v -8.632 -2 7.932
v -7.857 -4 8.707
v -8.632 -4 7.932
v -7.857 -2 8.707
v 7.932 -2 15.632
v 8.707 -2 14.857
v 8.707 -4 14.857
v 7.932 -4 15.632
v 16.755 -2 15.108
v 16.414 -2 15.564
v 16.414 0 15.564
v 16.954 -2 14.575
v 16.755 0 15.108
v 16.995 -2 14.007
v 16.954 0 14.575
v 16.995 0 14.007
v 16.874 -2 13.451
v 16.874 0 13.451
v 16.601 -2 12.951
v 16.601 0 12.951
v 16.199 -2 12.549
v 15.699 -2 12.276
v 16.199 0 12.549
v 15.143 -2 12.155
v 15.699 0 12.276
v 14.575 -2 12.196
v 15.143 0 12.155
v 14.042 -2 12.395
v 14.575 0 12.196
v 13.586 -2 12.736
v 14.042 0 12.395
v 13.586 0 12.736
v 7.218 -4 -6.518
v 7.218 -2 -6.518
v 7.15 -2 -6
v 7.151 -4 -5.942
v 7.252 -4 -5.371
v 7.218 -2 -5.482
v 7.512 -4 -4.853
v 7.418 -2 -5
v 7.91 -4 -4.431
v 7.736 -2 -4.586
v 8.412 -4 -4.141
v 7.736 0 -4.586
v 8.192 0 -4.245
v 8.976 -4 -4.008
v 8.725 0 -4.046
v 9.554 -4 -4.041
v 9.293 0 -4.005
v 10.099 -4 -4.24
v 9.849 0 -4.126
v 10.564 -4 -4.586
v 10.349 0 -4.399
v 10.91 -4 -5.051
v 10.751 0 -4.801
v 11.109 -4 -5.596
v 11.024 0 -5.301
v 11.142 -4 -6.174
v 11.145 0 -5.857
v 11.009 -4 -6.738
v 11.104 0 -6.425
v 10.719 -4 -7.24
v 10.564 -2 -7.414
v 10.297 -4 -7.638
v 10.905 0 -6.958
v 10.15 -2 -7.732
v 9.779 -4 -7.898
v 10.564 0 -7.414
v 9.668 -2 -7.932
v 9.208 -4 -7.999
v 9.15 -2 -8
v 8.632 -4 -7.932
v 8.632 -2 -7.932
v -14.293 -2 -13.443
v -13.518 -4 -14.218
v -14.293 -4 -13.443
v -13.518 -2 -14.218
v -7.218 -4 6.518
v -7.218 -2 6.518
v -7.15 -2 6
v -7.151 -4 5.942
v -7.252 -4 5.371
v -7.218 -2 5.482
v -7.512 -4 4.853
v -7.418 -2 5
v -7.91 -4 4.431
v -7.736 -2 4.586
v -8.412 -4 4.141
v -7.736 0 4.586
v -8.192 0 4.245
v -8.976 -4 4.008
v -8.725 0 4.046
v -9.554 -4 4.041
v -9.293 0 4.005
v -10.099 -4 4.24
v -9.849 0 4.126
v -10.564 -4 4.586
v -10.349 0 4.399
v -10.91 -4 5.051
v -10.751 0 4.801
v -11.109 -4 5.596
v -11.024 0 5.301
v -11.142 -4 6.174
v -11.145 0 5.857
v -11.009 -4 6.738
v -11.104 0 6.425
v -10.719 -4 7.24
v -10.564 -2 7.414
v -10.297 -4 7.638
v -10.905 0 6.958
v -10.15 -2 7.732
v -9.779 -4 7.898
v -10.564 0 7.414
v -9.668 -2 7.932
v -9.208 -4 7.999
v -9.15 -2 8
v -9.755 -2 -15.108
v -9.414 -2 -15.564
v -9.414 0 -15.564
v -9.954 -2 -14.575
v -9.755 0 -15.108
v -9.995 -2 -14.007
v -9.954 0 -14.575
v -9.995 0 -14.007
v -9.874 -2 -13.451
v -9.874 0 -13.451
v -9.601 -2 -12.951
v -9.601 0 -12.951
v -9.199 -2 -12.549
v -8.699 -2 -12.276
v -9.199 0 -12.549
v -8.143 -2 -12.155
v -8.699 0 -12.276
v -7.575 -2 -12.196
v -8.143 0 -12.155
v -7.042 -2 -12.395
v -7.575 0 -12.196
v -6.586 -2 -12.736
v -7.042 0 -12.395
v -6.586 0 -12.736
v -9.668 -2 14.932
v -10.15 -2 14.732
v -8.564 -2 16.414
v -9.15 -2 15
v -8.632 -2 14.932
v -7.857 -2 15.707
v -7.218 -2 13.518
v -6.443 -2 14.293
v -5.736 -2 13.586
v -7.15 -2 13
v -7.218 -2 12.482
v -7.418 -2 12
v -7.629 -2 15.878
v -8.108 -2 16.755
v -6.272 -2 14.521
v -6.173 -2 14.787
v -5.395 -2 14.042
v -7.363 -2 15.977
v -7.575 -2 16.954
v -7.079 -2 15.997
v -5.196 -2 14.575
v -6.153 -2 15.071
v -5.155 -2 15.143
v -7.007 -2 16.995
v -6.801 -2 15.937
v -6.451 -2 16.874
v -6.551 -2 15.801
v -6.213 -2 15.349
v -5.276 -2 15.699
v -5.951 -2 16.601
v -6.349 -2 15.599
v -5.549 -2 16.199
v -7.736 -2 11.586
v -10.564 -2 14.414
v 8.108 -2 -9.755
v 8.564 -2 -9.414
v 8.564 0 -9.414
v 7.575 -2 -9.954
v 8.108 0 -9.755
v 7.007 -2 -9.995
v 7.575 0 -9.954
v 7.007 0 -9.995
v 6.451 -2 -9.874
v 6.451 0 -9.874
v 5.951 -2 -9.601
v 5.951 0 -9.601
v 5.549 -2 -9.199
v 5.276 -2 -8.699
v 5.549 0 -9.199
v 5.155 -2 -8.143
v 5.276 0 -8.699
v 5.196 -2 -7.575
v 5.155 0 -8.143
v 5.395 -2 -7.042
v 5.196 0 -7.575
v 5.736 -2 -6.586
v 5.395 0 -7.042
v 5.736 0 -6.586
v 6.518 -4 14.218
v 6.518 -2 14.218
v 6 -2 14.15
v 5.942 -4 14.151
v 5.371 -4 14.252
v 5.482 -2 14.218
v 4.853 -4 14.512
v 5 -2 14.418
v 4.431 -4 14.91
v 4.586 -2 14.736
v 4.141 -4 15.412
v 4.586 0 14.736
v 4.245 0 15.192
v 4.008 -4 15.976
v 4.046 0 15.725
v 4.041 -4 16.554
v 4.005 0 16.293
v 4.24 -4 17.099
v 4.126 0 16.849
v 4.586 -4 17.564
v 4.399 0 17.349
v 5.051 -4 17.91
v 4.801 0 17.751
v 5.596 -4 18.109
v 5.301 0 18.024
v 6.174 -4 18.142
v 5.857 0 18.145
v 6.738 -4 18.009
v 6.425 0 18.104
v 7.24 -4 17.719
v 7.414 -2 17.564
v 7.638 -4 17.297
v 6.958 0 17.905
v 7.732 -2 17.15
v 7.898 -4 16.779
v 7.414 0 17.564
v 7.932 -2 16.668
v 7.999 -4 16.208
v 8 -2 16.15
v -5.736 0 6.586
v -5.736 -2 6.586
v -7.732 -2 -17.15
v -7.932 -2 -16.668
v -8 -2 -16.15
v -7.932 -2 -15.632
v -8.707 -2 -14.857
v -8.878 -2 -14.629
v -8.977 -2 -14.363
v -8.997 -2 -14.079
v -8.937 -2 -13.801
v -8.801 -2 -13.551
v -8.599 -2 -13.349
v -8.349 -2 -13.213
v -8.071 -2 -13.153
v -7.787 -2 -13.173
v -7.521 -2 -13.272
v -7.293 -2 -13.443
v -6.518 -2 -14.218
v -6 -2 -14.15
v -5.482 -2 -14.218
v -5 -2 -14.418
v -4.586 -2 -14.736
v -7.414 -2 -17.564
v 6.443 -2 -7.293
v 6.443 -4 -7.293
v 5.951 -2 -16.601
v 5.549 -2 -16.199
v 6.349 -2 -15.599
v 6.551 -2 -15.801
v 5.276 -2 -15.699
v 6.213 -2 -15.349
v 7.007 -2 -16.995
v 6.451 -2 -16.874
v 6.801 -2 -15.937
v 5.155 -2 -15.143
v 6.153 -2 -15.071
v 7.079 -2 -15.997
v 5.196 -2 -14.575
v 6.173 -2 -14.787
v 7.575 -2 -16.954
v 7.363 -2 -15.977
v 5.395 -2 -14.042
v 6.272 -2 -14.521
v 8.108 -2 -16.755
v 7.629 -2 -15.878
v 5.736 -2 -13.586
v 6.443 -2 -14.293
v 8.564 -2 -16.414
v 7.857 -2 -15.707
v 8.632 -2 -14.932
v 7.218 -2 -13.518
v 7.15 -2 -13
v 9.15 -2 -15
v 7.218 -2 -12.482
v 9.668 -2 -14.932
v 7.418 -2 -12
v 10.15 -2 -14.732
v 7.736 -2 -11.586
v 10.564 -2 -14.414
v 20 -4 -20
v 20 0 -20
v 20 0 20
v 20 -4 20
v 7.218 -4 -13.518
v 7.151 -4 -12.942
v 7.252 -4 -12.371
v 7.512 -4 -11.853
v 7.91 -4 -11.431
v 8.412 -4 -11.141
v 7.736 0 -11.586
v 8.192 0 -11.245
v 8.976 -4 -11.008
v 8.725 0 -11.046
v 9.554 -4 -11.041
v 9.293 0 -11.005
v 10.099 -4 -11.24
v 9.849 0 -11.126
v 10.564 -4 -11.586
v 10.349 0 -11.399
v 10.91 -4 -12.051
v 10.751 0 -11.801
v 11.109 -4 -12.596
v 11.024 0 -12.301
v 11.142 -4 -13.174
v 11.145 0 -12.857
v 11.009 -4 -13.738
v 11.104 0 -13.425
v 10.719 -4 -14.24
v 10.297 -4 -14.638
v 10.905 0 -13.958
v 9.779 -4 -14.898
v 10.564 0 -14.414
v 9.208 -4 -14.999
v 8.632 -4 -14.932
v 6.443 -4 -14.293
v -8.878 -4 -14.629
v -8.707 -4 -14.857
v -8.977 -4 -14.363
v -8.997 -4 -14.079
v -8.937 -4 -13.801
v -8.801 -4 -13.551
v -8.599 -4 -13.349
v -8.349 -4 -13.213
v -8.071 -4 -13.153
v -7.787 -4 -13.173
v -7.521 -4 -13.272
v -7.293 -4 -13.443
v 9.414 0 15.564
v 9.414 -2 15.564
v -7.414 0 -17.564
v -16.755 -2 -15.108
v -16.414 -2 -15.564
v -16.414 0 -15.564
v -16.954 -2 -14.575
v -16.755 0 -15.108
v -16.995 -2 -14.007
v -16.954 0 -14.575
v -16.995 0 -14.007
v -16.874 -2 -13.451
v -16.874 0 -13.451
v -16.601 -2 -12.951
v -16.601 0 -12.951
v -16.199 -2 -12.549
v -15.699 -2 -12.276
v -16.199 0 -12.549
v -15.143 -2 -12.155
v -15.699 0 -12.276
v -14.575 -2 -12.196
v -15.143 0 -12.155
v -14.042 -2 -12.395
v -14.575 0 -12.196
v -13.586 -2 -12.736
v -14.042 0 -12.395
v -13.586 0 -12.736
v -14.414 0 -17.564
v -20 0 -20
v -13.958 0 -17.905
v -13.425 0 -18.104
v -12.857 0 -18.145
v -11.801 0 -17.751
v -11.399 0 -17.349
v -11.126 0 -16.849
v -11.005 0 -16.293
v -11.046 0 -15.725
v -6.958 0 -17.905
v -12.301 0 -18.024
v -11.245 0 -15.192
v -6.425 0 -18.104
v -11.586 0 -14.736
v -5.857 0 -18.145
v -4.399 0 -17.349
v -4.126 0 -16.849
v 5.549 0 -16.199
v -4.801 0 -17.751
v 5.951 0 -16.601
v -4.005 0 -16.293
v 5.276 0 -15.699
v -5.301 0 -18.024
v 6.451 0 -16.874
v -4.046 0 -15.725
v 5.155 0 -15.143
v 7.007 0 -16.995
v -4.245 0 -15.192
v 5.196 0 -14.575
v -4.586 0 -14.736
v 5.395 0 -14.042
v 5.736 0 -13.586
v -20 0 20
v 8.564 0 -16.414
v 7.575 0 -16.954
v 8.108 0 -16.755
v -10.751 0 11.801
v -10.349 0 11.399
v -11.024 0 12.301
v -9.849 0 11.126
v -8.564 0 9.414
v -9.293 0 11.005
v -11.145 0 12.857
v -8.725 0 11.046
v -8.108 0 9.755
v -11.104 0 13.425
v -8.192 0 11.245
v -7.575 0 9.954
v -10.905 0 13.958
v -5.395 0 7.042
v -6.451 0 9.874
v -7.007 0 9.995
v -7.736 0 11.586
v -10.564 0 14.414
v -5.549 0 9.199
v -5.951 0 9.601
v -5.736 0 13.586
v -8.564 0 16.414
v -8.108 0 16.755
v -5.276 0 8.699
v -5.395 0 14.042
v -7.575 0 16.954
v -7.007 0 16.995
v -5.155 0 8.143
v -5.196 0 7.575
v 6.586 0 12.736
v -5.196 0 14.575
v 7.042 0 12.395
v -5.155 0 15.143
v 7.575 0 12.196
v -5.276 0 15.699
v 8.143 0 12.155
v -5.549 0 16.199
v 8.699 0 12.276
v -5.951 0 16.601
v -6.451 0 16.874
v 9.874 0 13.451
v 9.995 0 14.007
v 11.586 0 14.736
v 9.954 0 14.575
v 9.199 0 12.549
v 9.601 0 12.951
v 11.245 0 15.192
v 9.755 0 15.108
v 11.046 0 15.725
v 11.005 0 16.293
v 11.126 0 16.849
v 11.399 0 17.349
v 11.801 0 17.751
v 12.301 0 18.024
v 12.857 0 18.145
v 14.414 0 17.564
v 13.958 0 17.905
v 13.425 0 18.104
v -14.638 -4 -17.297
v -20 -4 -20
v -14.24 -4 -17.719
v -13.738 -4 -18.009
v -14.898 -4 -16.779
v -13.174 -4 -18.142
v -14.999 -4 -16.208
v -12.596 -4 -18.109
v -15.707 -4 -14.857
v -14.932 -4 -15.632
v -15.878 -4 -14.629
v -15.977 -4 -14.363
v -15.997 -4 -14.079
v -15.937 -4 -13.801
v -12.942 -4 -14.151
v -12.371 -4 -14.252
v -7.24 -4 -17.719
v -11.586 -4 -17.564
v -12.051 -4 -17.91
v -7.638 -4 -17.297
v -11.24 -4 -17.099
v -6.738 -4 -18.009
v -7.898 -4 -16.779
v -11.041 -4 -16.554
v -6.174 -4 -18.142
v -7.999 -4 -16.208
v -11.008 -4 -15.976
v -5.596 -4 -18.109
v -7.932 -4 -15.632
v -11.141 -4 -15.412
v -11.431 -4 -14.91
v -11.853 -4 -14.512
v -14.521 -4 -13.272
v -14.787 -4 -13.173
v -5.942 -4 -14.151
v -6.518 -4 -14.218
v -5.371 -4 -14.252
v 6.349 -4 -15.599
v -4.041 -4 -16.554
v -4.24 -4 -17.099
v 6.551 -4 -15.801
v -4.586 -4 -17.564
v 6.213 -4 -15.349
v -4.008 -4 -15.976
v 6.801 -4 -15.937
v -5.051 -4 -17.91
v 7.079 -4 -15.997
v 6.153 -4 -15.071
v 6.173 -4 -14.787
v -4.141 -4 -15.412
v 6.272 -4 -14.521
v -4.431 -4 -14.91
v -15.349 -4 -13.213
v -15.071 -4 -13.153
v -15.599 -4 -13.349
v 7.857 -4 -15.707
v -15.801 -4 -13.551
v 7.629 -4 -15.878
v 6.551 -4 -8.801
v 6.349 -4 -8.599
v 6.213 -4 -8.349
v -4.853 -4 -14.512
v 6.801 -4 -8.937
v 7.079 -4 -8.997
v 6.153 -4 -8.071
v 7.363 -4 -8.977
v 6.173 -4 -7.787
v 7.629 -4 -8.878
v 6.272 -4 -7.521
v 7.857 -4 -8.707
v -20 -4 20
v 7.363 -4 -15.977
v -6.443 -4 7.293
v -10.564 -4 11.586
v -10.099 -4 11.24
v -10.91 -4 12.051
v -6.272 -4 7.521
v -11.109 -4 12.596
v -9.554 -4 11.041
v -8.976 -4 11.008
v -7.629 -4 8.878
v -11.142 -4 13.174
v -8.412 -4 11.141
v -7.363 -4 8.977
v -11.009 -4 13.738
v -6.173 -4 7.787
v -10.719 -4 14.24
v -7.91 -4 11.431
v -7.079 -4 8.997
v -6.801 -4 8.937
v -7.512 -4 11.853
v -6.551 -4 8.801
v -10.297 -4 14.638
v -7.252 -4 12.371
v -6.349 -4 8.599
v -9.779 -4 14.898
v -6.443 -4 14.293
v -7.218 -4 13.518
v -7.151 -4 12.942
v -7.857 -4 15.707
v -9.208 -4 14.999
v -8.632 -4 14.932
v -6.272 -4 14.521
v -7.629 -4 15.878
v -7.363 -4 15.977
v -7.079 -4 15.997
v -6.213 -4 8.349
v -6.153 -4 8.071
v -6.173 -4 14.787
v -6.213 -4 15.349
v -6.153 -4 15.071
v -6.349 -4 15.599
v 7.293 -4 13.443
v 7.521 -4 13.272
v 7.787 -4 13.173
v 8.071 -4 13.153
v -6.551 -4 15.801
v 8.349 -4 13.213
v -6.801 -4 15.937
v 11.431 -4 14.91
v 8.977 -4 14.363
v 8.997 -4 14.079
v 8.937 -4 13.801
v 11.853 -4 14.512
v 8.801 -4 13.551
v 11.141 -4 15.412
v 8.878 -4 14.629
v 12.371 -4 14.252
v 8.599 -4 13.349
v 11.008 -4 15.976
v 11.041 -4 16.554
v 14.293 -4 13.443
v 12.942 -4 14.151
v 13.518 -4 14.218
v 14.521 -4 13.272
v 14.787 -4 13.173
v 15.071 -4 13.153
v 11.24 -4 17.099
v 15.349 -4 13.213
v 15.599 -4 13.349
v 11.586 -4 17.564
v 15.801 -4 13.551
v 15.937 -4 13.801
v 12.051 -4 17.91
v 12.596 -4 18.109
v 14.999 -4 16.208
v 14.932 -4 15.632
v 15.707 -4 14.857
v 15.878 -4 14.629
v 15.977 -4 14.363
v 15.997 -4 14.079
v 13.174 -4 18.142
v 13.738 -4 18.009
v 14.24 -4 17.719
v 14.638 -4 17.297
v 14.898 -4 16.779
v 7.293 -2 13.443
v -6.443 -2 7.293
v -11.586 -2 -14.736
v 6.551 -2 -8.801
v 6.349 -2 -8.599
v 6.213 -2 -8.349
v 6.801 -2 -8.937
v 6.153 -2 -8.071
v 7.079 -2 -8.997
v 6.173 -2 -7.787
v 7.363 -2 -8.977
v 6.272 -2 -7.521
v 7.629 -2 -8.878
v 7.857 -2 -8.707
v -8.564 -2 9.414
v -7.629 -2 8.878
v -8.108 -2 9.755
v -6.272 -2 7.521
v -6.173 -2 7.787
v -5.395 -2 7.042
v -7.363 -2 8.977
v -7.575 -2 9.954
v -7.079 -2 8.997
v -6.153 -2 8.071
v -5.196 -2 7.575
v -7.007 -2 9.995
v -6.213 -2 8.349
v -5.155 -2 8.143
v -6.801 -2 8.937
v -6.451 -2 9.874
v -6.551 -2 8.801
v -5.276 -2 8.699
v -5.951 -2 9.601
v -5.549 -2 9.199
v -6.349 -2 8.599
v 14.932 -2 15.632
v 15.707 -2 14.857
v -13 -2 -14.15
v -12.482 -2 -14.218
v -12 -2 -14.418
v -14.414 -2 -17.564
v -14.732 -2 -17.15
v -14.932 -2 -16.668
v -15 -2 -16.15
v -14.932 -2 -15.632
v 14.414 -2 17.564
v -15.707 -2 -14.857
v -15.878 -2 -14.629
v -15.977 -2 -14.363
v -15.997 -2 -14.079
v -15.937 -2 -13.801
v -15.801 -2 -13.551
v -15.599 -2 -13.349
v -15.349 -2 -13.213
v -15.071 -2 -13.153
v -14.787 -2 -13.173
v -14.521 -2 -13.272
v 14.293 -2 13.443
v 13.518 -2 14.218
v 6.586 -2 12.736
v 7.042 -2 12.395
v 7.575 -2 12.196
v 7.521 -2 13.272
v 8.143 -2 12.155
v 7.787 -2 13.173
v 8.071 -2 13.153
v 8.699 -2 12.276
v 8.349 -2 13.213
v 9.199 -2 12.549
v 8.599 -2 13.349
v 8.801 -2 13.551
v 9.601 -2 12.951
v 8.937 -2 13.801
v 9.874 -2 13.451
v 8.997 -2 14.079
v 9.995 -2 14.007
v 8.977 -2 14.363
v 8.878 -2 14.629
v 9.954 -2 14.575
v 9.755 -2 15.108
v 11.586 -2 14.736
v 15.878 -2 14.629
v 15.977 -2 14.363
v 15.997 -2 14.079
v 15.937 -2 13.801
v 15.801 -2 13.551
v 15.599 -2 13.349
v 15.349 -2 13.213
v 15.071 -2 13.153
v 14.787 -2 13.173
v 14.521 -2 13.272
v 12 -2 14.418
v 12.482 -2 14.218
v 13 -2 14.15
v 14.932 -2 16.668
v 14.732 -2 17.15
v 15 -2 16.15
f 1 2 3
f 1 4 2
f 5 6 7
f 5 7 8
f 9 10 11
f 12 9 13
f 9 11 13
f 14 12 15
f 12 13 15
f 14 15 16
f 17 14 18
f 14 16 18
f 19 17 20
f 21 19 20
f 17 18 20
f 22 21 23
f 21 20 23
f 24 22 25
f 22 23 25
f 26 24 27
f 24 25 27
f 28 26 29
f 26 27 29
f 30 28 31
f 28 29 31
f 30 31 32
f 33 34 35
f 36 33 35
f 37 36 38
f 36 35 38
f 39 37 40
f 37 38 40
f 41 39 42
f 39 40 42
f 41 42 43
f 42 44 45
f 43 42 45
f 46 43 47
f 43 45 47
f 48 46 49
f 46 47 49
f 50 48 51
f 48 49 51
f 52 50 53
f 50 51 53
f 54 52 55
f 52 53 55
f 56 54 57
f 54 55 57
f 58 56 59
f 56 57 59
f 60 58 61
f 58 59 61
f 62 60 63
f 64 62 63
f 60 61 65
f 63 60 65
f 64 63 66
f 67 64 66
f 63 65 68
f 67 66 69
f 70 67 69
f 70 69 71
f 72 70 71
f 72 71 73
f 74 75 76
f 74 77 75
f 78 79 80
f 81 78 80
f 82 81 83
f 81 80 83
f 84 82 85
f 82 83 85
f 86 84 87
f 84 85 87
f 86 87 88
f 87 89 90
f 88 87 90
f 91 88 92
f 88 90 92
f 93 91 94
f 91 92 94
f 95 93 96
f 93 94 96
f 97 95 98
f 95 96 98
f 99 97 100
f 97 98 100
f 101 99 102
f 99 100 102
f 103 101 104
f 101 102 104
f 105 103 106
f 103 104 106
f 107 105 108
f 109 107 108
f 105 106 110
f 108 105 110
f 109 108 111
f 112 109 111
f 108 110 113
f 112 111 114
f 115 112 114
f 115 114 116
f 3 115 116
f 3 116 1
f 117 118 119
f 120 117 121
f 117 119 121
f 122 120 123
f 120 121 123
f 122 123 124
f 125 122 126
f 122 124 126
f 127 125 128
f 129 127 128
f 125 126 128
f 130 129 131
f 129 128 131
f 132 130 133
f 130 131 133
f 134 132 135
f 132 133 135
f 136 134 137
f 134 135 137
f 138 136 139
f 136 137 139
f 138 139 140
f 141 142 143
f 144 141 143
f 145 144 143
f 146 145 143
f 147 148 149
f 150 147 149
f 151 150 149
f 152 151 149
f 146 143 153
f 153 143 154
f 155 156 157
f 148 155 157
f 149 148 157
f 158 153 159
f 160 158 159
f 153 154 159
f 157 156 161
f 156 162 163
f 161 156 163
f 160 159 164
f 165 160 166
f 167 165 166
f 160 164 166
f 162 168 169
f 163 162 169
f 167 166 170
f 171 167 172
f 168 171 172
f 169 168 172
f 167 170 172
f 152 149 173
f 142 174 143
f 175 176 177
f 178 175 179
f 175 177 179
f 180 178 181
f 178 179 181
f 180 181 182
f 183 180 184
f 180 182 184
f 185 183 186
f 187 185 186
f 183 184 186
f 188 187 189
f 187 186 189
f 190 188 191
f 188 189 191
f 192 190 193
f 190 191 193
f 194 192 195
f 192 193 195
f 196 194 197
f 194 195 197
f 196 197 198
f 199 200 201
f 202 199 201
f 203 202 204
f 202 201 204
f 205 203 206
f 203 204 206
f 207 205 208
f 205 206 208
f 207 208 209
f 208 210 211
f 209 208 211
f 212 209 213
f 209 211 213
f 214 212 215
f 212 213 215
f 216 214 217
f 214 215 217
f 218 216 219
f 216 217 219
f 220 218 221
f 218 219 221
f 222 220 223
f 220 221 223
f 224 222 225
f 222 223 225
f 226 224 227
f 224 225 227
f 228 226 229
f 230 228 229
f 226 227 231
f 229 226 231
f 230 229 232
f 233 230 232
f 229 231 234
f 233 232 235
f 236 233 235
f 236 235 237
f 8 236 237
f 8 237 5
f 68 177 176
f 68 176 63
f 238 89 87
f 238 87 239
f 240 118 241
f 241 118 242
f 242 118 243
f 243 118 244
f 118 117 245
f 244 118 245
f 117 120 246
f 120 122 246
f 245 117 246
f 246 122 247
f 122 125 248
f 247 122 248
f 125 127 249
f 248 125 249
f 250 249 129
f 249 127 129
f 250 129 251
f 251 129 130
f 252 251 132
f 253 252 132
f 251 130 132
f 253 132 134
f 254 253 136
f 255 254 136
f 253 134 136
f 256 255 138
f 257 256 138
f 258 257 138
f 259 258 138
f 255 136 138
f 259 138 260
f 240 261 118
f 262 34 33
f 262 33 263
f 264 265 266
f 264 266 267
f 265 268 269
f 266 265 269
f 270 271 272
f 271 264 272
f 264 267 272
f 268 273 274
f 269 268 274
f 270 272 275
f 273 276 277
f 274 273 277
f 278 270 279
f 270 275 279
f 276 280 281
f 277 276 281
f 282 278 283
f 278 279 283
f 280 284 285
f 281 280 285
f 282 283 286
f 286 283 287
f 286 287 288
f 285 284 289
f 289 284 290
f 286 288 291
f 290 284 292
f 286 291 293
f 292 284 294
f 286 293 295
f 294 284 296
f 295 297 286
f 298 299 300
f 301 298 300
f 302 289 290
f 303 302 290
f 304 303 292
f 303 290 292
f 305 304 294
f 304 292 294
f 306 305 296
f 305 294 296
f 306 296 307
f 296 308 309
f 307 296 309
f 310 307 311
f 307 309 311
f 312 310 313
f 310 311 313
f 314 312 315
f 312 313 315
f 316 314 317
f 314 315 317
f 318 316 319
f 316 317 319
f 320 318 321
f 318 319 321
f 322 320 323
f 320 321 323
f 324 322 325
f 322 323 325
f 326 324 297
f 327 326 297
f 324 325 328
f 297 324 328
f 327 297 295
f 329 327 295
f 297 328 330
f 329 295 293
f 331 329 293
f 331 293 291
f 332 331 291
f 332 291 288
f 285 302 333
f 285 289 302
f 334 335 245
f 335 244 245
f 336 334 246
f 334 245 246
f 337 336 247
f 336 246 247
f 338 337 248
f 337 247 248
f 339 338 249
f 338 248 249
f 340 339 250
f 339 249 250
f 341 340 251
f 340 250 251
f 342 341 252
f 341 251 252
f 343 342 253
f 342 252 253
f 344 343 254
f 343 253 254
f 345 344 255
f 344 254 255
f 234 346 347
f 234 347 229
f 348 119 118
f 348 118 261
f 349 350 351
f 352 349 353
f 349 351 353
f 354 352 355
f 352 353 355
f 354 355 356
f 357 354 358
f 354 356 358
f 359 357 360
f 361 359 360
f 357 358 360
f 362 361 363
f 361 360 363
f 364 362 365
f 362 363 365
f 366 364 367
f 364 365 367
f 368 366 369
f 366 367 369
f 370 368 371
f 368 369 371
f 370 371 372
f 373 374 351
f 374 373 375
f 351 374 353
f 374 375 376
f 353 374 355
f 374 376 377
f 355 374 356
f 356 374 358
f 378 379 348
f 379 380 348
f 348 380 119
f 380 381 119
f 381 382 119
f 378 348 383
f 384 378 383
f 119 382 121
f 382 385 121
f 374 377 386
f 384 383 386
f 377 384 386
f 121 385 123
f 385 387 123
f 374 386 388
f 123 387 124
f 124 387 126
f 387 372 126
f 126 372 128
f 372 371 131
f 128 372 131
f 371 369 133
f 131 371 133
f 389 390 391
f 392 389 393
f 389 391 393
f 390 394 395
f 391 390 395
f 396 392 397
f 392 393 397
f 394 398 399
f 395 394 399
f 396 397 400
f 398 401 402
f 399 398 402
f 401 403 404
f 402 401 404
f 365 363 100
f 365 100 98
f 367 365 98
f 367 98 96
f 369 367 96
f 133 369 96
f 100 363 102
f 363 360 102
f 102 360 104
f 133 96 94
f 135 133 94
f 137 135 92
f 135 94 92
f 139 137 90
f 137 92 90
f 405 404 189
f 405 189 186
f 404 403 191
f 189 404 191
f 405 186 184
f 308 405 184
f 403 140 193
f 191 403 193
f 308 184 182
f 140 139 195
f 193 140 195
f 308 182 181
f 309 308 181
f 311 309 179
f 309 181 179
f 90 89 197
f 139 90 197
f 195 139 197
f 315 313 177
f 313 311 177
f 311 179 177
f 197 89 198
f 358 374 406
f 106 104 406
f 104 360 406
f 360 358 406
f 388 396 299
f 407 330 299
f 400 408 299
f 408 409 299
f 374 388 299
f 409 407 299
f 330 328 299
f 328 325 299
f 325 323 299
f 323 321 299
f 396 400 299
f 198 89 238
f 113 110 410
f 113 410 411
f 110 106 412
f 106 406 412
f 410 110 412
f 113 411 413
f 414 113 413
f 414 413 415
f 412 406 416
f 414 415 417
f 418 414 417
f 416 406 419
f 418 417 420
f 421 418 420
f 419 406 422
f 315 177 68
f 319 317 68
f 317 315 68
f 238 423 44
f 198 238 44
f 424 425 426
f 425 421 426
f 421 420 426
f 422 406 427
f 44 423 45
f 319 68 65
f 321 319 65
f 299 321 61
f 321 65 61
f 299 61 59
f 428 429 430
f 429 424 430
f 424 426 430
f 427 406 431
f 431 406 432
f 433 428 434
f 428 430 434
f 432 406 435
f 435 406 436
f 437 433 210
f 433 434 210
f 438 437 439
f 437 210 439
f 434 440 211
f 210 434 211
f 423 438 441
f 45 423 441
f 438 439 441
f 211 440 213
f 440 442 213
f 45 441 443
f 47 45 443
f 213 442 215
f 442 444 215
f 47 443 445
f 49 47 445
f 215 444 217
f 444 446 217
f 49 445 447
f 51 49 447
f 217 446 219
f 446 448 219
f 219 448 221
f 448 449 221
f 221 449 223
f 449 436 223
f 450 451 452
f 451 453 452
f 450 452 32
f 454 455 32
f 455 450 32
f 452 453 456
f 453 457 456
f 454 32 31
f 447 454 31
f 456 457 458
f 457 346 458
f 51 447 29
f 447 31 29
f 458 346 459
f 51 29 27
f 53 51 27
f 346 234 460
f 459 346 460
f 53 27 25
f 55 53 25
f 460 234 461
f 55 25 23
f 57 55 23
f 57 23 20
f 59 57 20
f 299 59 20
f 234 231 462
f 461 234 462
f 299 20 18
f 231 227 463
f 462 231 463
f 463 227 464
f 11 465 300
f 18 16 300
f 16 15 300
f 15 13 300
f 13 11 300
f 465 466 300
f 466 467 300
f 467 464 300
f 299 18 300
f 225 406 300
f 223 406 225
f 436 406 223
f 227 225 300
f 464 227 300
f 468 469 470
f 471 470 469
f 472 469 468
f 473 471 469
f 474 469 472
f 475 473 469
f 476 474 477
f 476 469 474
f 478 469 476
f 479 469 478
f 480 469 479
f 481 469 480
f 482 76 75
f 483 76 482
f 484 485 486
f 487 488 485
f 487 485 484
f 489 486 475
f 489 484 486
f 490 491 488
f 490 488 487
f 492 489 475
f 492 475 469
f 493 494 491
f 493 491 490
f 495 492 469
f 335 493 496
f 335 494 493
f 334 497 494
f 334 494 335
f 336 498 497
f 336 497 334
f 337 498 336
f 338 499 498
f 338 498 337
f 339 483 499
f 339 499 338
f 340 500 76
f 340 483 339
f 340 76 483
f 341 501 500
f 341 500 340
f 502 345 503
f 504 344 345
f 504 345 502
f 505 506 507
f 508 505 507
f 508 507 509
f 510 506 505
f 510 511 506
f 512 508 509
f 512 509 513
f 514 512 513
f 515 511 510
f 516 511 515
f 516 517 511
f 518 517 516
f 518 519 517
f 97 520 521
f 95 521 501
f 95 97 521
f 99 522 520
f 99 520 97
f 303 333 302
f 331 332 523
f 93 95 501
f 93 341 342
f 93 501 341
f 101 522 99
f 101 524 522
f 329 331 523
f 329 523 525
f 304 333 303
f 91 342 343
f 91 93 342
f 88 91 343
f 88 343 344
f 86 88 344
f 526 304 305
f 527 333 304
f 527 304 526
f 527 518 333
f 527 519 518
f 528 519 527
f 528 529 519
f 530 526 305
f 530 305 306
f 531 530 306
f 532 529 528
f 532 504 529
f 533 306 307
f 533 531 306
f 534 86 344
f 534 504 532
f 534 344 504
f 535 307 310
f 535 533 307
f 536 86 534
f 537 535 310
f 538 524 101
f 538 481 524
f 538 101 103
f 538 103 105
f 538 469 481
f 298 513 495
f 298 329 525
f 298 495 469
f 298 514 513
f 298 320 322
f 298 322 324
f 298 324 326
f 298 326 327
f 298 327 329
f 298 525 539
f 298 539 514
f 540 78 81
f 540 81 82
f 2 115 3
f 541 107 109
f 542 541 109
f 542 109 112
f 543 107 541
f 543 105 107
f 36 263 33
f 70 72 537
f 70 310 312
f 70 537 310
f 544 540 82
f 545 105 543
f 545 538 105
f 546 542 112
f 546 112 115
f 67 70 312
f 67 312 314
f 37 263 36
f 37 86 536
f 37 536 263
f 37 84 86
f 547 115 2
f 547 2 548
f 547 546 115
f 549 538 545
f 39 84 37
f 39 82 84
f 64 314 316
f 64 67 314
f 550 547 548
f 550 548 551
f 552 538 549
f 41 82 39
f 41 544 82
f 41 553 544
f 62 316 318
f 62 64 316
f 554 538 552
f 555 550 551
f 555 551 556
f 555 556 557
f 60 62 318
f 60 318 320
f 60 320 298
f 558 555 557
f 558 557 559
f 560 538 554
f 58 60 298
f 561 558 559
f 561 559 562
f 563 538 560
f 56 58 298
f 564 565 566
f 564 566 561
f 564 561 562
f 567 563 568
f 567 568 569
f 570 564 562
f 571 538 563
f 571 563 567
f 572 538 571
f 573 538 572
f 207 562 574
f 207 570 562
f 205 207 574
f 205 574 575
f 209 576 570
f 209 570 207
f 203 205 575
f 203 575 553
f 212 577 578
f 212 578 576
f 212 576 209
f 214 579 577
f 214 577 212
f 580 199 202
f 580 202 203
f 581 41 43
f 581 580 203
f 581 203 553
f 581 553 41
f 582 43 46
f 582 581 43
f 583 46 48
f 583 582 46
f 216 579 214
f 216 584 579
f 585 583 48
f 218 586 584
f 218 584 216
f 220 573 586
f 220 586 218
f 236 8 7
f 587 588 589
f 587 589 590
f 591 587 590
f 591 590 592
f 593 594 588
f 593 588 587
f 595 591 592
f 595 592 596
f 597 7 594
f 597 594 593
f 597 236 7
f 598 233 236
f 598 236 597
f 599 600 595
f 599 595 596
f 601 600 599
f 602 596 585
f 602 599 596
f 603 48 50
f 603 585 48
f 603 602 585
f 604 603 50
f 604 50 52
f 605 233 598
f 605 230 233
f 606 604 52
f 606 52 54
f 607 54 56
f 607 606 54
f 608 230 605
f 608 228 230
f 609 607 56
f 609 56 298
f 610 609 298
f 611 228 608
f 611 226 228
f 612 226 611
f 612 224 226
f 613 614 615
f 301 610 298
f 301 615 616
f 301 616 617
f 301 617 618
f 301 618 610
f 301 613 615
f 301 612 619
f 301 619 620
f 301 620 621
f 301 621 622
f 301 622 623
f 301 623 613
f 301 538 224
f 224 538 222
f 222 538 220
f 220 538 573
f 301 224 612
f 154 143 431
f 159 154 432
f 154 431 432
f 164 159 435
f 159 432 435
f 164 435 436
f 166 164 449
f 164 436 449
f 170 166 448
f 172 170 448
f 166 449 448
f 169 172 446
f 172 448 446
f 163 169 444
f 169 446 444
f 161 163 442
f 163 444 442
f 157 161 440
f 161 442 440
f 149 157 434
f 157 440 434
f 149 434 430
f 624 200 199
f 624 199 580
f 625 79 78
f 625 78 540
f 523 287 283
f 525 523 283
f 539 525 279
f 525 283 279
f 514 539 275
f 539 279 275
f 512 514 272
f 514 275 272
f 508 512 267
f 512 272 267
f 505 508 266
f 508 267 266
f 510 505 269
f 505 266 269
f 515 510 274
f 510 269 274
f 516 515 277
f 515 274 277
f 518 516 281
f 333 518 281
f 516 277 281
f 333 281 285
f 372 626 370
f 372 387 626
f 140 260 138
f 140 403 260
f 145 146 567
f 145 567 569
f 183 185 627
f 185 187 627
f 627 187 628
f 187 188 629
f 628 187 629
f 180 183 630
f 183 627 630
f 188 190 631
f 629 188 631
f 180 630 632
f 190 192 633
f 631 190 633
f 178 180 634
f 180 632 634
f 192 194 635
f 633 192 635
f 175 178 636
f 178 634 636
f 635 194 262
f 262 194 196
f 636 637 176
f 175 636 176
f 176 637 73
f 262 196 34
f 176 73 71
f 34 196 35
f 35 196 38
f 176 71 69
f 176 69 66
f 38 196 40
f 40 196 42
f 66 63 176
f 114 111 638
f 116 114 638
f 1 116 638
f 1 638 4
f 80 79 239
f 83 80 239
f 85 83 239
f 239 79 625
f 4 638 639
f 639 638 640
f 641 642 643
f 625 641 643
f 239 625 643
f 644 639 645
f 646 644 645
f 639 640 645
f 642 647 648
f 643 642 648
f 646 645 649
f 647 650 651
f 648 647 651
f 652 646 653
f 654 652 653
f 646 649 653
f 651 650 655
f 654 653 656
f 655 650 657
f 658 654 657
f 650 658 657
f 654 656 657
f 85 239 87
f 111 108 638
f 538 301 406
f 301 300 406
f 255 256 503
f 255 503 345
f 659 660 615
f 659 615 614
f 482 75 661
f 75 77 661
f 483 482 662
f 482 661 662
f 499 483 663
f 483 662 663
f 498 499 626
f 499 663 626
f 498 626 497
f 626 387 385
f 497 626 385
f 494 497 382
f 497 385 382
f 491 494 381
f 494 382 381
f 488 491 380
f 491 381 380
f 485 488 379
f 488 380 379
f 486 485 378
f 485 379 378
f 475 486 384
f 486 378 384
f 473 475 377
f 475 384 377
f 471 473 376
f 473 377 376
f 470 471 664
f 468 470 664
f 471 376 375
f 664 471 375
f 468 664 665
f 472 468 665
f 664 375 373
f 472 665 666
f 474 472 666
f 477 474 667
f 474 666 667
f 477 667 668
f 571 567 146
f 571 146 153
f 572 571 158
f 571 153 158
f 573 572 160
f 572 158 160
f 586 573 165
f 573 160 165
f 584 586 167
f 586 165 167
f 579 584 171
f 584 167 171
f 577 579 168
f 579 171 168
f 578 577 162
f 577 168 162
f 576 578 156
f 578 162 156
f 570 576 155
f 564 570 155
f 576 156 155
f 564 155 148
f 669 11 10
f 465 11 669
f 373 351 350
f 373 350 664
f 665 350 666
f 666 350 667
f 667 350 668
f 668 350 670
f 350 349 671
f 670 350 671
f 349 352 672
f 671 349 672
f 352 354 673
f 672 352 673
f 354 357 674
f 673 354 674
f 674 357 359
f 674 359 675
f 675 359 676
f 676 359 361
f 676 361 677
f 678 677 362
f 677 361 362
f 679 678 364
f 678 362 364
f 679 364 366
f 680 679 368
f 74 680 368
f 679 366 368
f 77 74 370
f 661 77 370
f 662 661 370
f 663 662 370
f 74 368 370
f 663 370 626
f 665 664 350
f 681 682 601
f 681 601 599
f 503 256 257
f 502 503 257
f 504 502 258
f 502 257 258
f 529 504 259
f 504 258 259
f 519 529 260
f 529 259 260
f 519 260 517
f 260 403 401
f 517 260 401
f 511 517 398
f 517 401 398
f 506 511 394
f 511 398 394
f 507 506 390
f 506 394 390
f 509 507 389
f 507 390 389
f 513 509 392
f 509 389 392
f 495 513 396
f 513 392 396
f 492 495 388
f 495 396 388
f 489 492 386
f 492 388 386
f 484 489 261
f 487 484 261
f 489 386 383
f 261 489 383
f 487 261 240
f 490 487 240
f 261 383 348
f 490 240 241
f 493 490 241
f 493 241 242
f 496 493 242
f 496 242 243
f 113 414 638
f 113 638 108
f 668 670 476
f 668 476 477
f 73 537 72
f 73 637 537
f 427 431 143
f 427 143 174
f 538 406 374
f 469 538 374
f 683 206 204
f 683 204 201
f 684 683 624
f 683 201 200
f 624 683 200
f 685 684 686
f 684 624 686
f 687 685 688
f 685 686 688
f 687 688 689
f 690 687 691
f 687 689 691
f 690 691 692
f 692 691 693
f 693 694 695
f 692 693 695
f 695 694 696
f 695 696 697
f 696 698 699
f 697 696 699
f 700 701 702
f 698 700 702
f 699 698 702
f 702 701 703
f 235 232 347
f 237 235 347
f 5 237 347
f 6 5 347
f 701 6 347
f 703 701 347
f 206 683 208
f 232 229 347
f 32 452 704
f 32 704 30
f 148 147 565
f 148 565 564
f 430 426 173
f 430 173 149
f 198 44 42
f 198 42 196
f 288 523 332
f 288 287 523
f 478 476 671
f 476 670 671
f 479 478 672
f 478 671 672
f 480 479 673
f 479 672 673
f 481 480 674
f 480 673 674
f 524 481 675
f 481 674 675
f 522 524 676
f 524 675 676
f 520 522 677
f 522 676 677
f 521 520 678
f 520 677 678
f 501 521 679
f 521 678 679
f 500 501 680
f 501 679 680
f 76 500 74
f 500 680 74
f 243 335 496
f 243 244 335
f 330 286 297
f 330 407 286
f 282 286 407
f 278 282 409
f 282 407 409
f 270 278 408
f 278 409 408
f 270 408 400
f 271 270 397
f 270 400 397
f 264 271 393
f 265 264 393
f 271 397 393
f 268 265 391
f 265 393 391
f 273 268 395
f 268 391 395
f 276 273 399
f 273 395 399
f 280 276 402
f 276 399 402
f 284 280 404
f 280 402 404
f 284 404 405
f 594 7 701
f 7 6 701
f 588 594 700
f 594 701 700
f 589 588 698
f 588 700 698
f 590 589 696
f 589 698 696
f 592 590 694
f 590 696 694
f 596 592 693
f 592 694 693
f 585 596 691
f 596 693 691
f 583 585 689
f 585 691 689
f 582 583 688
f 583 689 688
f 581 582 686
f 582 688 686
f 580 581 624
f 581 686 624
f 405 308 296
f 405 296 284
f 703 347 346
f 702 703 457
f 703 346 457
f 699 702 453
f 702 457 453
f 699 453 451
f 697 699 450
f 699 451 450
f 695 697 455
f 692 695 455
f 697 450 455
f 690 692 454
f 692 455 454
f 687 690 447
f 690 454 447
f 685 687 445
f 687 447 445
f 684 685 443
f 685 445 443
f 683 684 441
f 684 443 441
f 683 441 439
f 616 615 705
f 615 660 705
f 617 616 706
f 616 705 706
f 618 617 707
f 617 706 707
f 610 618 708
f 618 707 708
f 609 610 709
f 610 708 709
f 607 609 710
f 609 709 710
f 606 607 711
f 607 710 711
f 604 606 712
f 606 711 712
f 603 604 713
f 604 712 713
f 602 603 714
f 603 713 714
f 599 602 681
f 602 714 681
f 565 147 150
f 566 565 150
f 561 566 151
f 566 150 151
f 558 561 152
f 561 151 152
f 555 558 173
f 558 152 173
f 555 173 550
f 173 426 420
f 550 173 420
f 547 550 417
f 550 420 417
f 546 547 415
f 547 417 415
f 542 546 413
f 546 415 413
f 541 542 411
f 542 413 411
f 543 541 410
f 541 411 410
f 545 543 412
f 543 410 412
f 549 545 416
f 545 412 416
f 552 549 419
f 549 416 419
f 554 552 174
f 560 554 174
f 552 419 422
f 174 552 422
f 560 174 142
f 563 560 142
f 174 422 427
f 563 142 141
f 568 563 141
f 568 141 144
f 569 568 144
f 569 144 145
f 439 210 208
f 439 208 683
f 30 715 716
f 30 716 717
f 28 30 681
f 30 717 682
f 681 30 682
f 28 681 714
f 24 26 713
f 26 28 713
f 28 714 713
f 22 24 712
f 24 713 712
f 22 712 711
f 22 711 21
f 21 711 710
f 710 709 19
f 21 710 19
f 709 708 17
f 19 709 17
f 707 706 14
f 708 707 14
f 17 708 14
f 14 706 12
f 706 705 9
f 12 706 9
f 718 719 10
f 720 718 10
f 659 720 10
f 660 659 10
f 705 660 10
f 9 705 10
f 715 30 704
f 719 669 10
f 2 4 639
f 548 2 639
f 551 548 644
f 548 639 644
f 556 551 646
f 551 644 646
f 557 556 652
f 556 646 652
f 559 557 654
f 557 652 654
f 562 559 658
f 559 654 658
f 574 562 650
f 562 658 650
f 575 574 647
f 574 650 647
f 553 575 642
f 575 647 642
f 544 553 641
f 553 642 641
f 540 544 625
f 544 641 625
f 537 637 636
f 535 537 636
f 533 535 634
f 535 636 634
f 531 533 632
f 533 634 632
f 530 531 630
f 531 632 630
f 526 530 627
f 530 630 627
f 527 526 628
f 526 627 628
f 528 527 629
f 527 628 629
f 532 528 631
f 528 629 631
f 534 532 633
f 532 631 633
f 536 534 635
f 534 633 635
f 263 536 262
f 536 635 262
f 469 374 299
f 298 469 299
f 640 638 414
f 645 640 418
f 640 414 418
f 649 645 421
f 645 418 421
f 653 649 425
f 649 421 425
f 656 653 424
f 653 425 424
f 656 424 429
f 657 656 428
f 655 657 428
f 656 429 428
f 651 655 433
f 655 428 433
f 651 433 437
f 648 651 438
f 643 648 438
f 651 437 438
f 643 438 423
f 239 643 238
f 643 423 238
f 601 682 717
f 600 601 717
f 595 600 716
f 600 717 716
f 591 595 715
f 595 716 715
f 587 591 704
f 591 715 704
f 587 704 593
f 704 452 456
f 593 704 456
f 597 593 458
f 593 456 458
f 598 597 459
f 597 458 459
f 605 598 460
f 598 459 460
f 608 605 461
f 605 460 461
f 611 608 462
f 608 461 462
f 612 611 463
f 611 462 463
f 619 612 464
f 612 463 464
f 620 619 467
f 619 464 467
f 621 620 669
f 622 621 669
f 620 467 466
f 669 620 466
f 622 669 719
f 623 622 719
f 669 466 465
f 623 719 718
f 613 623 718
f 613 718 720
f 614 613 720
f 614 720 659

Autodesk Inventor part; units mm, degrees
ref_plane "YZ Plane" through (0, 0, 0) normal (1, 0, 0) x (0, 1, 0)
ref_plane "XZ Plane" through (0, 0, 0) normal (0, 1, 0) x (-1, 0, 0)
ref_plane "XY Plane" through (0, 0, 0) normal (0, 0, 1) x (1, 0, 0)
sketch "Sketch6" plane through (0, 0, 0) normal (0, 1, 0) x (-1, 0, 0)
  line L0 (20, 20) -> (-20, 20)
  line L1 (-20, 20) -> (-20, -20)
  line L2 (-20, -20) -> (20, -20)
  line L3 (20, -20) -> (20, 20)
  line L4 (20, 20) -> (-20, -20) construction
  line L5 (-20, 20) -> (20, -20) construction
  line L6 (2.15, 11.15) -> (-2.15, 11.15)
  line L7 (-2.15, 11.15) -> (-2.15, -11.15)
  line L8 (-2.15, -11.15) -> (2.15, -11.15)
  line L9 (2.15, -11.15) -> (2.15, 11.15)
  line L10 (2.15, 11.15) -> (-2.15, -11.15) construction
  line L11 (-2.15, 11.15) -> (2.15, -11.15) construction
  line L12 (2.15, -11.15) -> (-20, -11.15)
  line L13 (-20, -11.15) -> (-20, -20)
  line L14 (-20, -20) -> (2.15, -20)
  line L15 (2.15, -20) -> (2.15, -11.15)
  line L16 (-2.15, 11.15) -> (20, 11.15)
  line L17 (20, 11.15) -> (20, 20)
  line L18 (20, 20) -> (-2.15, 20)
  line L19 (-2.15, 20) -> (-2.15, 11.15)
  line L20 (-20, -11.15) -> (-15, -11.15)
  line L21 (-15, -11.15) -> (-15, -14.15)
  line L22 (-15, -14.15) -> (-20, -14.15)
  line L23 (-20, -14.15) -> (-20, -11.15)
  line L24 (-20, -11.15) -> (-8, -11.15)
  line L25 (-8, -11.15) -> (-8, -14.15)
  line L26 (-8, -14.15) -> (-20, -14.15)
  line L27 (-20, -14.15) -> (-20, -11.15)
  line L28 (-2.15, 20) -> (-7.15, 20)
  line L29 (-7.15, 20) -> (-7.15, 15)
  line L30 (-7.15, 15) -> (-2.15, 15)
  line L31 (-2.15, 15) -> (-2.15, 20)
  line L32 (-2.15, 20) -> (-7.15, 20)
  line L33 (-7.15, 20) -> (-7.15, 8)
  line L34 (-7.15, 8) -> (-2.15, 8)
  line L35 (-2.15, 8) -> (-2.15, 20)
  line L36 (20, 11.15) -> (15, 11.15)
  line L37 (15, 11.15) -> (15, 14.15)
  line L38 (15, 14.15) -> (20, 14.15)
  line L39 (20, 14.15) -> (20, 11.15)
  line L40 (20, 11.15) -> (8, 11.15)
  line L41 (8, 11.15) -> (8, 14.15)
  line L42 (8, 14.15) -> (20, 14.15)
  line L43 (20, 14.15) -> (20, 11.15)
  line L44 (2.15, -20) -> (7.15, -20)
  line L45 (7.15, -20) -> (7.15, -15)
  line L46 (7.15, -15) -> (2.15, -15)
  line L47 (2.15, -15) -> (2.15, -20)
  line L48 (2.15, -20) -> (7.15, -20)
  line L49 (7.15, -20) -> (7.15, -8)
  line L50 (7.15, -8) -> (2.15, -8)
  line L51 (2.15, -8) -> (2.15, -20)
  circle A0 centre (-13, -16.15) radius 2
  circle A1 centre (-6, -16.15) radius 2
  circle A2 centre (9.15, -13) radius 2
  circle A3 centre (9.15, -6) radius 2
  circle A4 centre (6, 16.15) radius 2
  circle A5 centre (13, 16.15) radius 2
  circle A6 centre (-9.15, 6) radius 2
  circle A7 centre (-9.15, 13) radius 2
  line L52 (-13, -16.15) -> (-15, -16.15)
  line L53 (-15, -16.15) -> (-15, -14.15)
  line L54 (-15, -14.15) -> (-13, -14.15)
  line L55 (-13, -14.15) -> (-13, -16.15)
  line L56 (-6, -16.15) -> (-8, -16.15)
  line L57 (-8, -16.15) -> (-8, -14.15)
  line L58 (-8, -14.15) -> (-6, -14.15)
  line L59 (-6, -14.15) -> (-6, -16.15)
  line L60 (9.15, -13) -> (7.15, -13)
  line L61 (7.15, -13) -> (7.15, -15)
  line L62 (7.15, -15) -> (9.15, -15)
  line L63 (9.15, -15) -> (9.15, -13)
  line L64 (9.15, -6) -> (7.15, -6)
  line L65 (7.15, -6) -> (7.15, -8)
  line L66 (7.15, -8) -> (9.15, -8)
  line L67 (9.15, -8) -> (9.15, -6)
  line L68 (13, 16.15) -> (15, 16.15)
  line L69 (15, 16.15) -> (15, 14.15)
  line L70 (15, 14.15) -> (13, 14.15)
  line L71 (13, 14.15) -> (13, 16.15)
  line L72 (6, 16.15) -> (8, 16.15)
  line L73 (8, 16.15) -> (8, 14.15)
  line L74 (8, 14.15) -> (6, 14.15)
  line L75 (6, 14.15) -> (6, 16.15)
  line L76 (-9.15, 13) -> (-7.15, 13)
  line L77 (-7.15, 13) -> (-7.15, 15)
  line L78 (-7.15, 15) -> (-9.15, 15)
  line L79 (-9.15, 15) -> (-9.15, 13)
  line L80 (-9.15, 6) -> (-7.15, 6)
  line L81 (-7.15, 6) -> (-7.15, 8)
  line L82 (-7.15, 8) -> (-9.15, 8)
  line L83 (-9.15, 8) -> (-9.15, 6)
  line L84 (-15, -14.15) -> (-13, -16.15) construction
  line L85 (-16.4142, -15.5642) -> (-14.4142, -17.5642)
  line L86 (-11.5858, -14.7358) -> (-13.5858, -12.7358)
  arc A8 (-13.5858, -12.7358) -> (-16.4142, -15.5642) centre (-15, -14.15) ccw
  arc A9 (-14.4142, -17.5642) -> (-11.5858, -14.7358) centre (-13, -16.15) ccw
  line L87 (-8, -14.15) -> (-6, -16.15) construction
  line L88 (-9.4142, -15.5642) -> (-7.4142, -17.5642)
  line L89 (-4.5858, -14.7358) -> (-6.5858, -12.7358)
  arc A10 (-6.5858, -12.7358) -> (-9.4142, -15.5642) centre (-8, -14.15) ccw
  arc A11 (-7.4142, -17.5642) -> (-4.5858, -14.7358) centre (-6, -16.15) ccw
  line L90 (7.15, -15) -> (9.15, -13) construction
  line L91 (8.5642, -16.4142) -> (10.5642, -14.4142)
  line L92 (7.7358, -11.5858) -> (5.7358, -13.5858)
  arc A12 (5.7358, -13.5858) -> (8.5642, -16.4142) centre (7.15, -15) ccw
  arc A13 (10.5642, -14.4142) -> (7.7358, -11.5858) centre (9.15, -13) ccw
  line L93 (7.15, -8) -> (9.15, -6) construction
  line L94 (8.5642, -9.4142) -> (10.5642, -7.4142)
  line L95 (7.7358, -4.5858) -> (5.7358, -6.5858)
  arc A14 (5.7358, -6.5858) -> (8.5642, -9.4142) centre (7.15, -8) ccw
  arc A15 (10.5642, -7.4142) -> (7.7358, -4.5858) centre (9.15, -6) ccw
  line L96 (15, 14.15) -> (13, 16.15) construction
  line L97 (16.4142, 15.5642) -> (14.4142, 17.5642)
  line L98 (11.5858, 14.7358) -> (13.5858, 12.7358)
  arc A16 (13.5858, 12.7358) -> (16.4142, 15.5642) centre (15, 14.15) ccw
  arc A17 (14.4142, 17.5642) -> (11.5858, 14.7358) centre (13, 16.15) ccw
  line L99 (8, 14.15) -> (6, 16.15) construction
  line L100 (9.4142, 15.5642) -> (7.4142, 17.5642)
  line L101 (4.5858, 14.7358) -> (6.5858, 12.7358)
  arc A18 (6.5858, 12.7358) -> (9.4142, 15.5642) centre (8, 14.15) ccw
  arc A19 (7.4142, 17.5642) -> (4.5858, 14.7358) centre (6, 16.15) ccw
  line L102 (-7.15, 15) -> (-9.15, 13) construction
  line L103 (-8.5642, 16.4142) -> (-10.5642, 14.4142)
  line L104 (-7.7358, 11.5858) -> (-5.7358, 13.5858)
  arc A20 (-5.7358, 13.5858) -> (-8.5642, 16.4142) centre (-7.15, 15) ccw
  arc A21 (-10.5642, 14.4142) -> (-7.7358, 11.5858) centre (-9.15, 13) ccw
  line L105 (-7.15, 8) -> (-9.15, 6) construction
  line L106 (-8.5642, 9.4142) -> (-10.5642, 7.4142)
  line L107 (-7.7358, 4.5858) -> (-5.7358, 6.5858)
  arc A22 (-5.7358, 6.5858) -> (-8.5642, 9.4142) centre (-7.15, 8) ccw
  arc A23 (-10.5642, 7.4142) -> (-7.7358, 4.5858) centre (-9.15, 6) ccw
  line L108 (9.15, -13) -> (7.15, -15) construction
  line L109 (8.4429, -12.2929) -> (6.4429, -14.2929)
  line L110 (7.8571, -15.7071) -> (9.8571, -13.7071)
  arc A24 (9.8571, -13.7071) -> (8.4429, -12.2929) centre (9.15, -13) ccw
  arc A25 (6.4429, -14.2929) -> (7.8571, -15.7071) centre (7.15, -15) ccw
  line L111 (-6, -16.15) -> (-8, -14.15) construction
  line L112 (-5.2929, -15.4429) -> (-7.2929, -13.4429)
  line L113 (-8.7071, -14.8571) -> (-6.7071, -16.8571)
  arc A26 (-6.7071, -16.8571) -> (-5.2929, -15.4429) centre (-6, -16.15) ccw
  arc A27 (-7.2929, -13.4429) -> (-8.7071, -14.8571) centre (-8, -14.15) ccw
  line L114 (-13, -16.15) -> (-15, -14.15) construction
  line L115 (-12.2929, -15.4429) -> (-14.2929, -13.4429)
  line L116 (-15.7071, -14.8571) -> (-13.7071, -16.8571)
  arc A28 (-13.7071, -16.8571) -> (-12.2929, -15.4429) centre (-13, -16.15) ccw
  arc A29 (-14.2929, -13.4429) -> (-15.7071, -14.8571) centre (-15, -14.15) ccw
  line L117 (9.15, -6) -> (7.15, -8) construction
  line L118 (8.4429, -5.2929) -> (6.4429, -7.2929)
  line L119 (7.8571, -8.7071) -> (9.8571, -6.7071)
  arc A30 (9.8571, -6.7071) -> (8.4429, -5.2929) centre (9.15, -6) ccw
  arc A31 (6.4429, -7.2929) -> (7.8571, -8.7071) centre (7.15, -8) ccw
  line L120 (15, 14.15) -> (13, 16.15) construction
  line L121 (15.7071, 14.8571) -> (13.7071, 16.8571)
  line L122 (12.2929, 15.4429) -> (14.2929, 13.4429)
  arc A32 (14.2929, 13.4429) -> (15.7071, 14.8571) centre (15, 14.15) ccw
  arc A33 (13.7071, 16.8571) -> (12.2929, 15.4429) centre (13, 16.15) ccw
  line L123 (6, 16.15) -> (8, 14.15) construction
  line L124 (5.2929, 15.4429) -> (7.2929, 13.4429)
  line L125 (8.7071, 14.8571) -> (6.7071, 16.8571)
  arc A34 (6.7071, 16.8571) -> (5.2929, 15.4429) centre (6, 16.15) ccw
  arc A35 (7.2929, 13.4429) -> (8.7071, 14.8571) centre (8, 14.15) ccw
  line L126 (-7.15, 8) -> (-9.15, 6) construction
  line L127 (-7.8571, 8.7071) -> (-9.8571, 6.7071)
  line L128 (-8.4429, 5.2929) -> (-6.4429, 7.2929)
  arc A36 (-6.4429, 7.2929) -> (-7.8571, 8.7071) centre (-7.15, 8) ccw
  arc A37 (-9.8571, 6.7071) -> (-8.4429, 5.2929) centre (-9.15, 6) ccw
  line L129 (-7.15, 15) -> (-9.15, 13) construction
  line L130 (-7.8571, 15.7071) -> (-9.8571, 13.7071)
  line L131 (-8.4429, 12.2929) -> (-6.4429, 14.2929)
  arc A38 (-6.4429, 14.2929) -> (-7.8571, 15.7071) centre (-7.15, 15) ccw
  arc A39 (-9.8571, 13.7071) -> (-8.4429, 12.2929) centre (-9.15, 13) ccw
  point P0 (0, 0)
  point P1 (-14, -15.15)
  point P2 (-7, -15.15)
  point P3 (8.15, -14)
  point P4 (8.15, -7)
  point P5 (14, 15.15)
  point P6 (7, 15.15)
  point P7 (-8.15, 14)
  point P8 (-8.15, 7)
  point P9 (8.15, -14)
  point P10 (-7, -15.15)
  point P11 (-14, -15.15)
  point P12 (8.15, -7)
  point P13 (14, 15.15)
  point P14 (7, 15.15)
  point P15 (-8.15, 7)
  point P16 (-8.15, 14)
  dimension "d79" = 40
  dimension "d80" = 40
  dimension "d81" = 4.3
  dimension "d82" = 22.3
  dimension "d83" = 5
  dimension "d84" = 3
  dimension "d85" = 12
  dimension "d86" = 5
  dimension "d87" = 5
  dimension "d88" = 12
  dimension "d93" = 5
  dimension "d94" = 3
  dimension "d95" = 12
  dimension "d96" = 5
  dimension "d97" = 5
  dimension "d98" = 12
  dimension "d127" = 4
  dimension "d128" = 4
  dimension "d129" = 4
  dimension "d130" = 4
  dimension "d131" = 4
  dimension "d132" = 4
  dimension "d133" = 4
  dimension "d134" = 4
  dimension "d137" = 4
  dimension "d140" = 2
  dimension "d141" = 2
  dimension "d142" = 2
  dimension "d143" = 2
  dimension "d144" = 2
  dimension "d145" = 2
  dimension "d146" = 2
  dimension "d147" = 2
extrude "Extrusion9" add sketch "Sketch6" along normal blind 4 contours L3 L38 A16 L97 A5 L98 L42 A18 L100 A4 L101 L41 L16 L6 L19 L0 | L19 L30 A20 L29 L0 | L3 L16 L37 A16 L38 | L29 A20 L103 A7 L104 L33 A22 L106 A6 L107 L34 L7 L12 L1 L0 | L19 L7 L34 A22 L33 L104 A20 L30 | L3 L2 L45 A12 L91 A2 L92 L49 A14 L94 A3 L95 L50 L9 L16 | A16 L37 A32 L38 | L38 A32 L121 L69 A5 L97 A16 | A20 L30 A38 L29 | L29 A38 L130 L78 A7 L103 A20 | L6 L9 L8 L7 | A20 L104 L33 L131 A38 L30 | L16 L41 A18 L42 L98 A16 L37 | A32 L37 L38 | L38 L69 L121 A32 | A16 L98 L42 L122 A32 L37 | L12 L21 A8 L22 L1 | A38 L30 L29 | L29 L78 L130 A38 | A38 L131 L33 L30 | L2 L15 L46 A12 L45 | L37 A32 L122 L42 | L42 L122 A5 L121 L69 | L22 A8 L85 A0 L86 L26 A10 L88 A1 L89 L25 L12 L8 L15 L2 L1 | L12 L25 A10 L26 L86 A8 L21 | L33 L131 A7 L130 L78 | L50 A14 L49 L92 A12 L46 L15 L9 | A22 L107 A6 L81 L128 A36 L34 | L34 A36 L33 A22 | L104 A7 L33 | A12 L46 A25 L45 | L45 A25 L110 L62 A2 L91 A12 | A18 L101 A4 L74 L124 A35 L41 | L41 A35 L42 A18 | L42 A5 L122 | L121 A5 L69 | L98 A5 L42 | A8 L21 A29 L22 | L22 A29 L116 L53 A0 L85 A8 | A8 L86 L26 L115 A29 L21 | L33 A7 L131 | L130 A7 L78 | A14 L95 A3 L65 L118 A31 L50 | L50 A31 L49 A14 | A36 L128 L81 L34 | L34 L33 A36 | L33 A36 L127 L82 A6 L106 A22 | A25 L46 L45 | L45 L62 L110 A25 | A12 L92 L49 L109 A25 L46 | A35 L124 L74 L41 | L41 L42 A35 | L42 A35 L125 L73 A4 L100 A18 | A29 L21 L22 | L22 L53 L116 A29 | A10 L89 A1 L58 L112 A27 L25 | L25 A27 L26 A10 | A29 L115 L26 L21 | A31 L118 L65 L50 | L50 L49 A31 | L49 A31 L119 L66 A3 L94 A14 | L82 L127 A36 L33 | L81 L128 A6 L127 L82 | L46 A25 L109 L49 | L49 L109 A2 L110 L62 | L73 L125 A35 L42 | L74 L124 A4 L125 L73 | L26 L115 A0 L116 L53 | A27 L112 L58 L25 | L25 L26 A27 | L26 A27 L113 L57 A1 L88 A10 | L86 A0 L26 | L66 L119 A31 L49 | L65 L118 A3 L119 L66 | L92 A2 L49 | L81 A6 L128 | L127 A6 L82 | L49 A2 L109 | L110 A2 L62 | L125 A4 L73 | L74 A4 L124 | L26 A0 L115 | L116 A0 L53 | L57 L113 A27 L26 | L58 L112 A1 L113 L57 | L65 A3 L118 | L119 A3 L66 | L113 A1 L57 | L58 A1 L112
extrude "Extrusion10" cut sketch "Sketch6" along normal blind 2 contours A16 L37 A32 L38 | L38 A32 L121 L69 A5 L97 A16 | A20 L30 A38 L29 | L29 A38 L130 L78 A7 L103 A20 | A20 L104 L33 L131 A38 L30 | A32 L37 L38 | L38 L69 L121 A32 | A16 L98 L42 L122 A32 L37 | A38 L30 L29 | L29 L78 L130 A38 | A38 L131 L33 L30 | L37 A32 L122 L42 | L42 L122 A5 L121 L69 | A5 L68 L121 A33 L122 L71 | L33 L131 A7 L130 L78 | A7 L79 L130 A39 L131 L76 | A22 L107 A6 L81 L128 A36 L34 | L34 A36 L33 A22 | L104 A7 L33 | A12 L46 A25 L45 | L45 A25 L110 L62 A2 L91 A12 | A18 L101 A4 L74 L124 A35 L41 | L41 A35 L42 A18 | L42 A5 L122 | L121 A5 L69 | L98 A5 L42 | A5 L121 L68 | A8 L21 A29 L22 | L22 A29 L116 L53 A0 L85 A8 | A8 L86 L26 L115 A29 L21 | L33 A7 L131 | L130 A7 L78 | A7 L130 L79 | A14 L95 A3 L65 L118 A31 L50 | L50 A31 L49 A14 | A36 L128 L81 L34 | L34 L33 A36 | L33 A36 L127 L82 A6 L106 A22 | L76 L131 A7 | A25 L46 L45 | L45 L62 L110 A25 | A12 L92 L49 L109 A25 L46 | A35 L124 L74 L41 | L41 L42 A35 | L42 A35 L125 L73 A4 L100 A18 | L71 L122 A5 | L122 L71 L68 L121 A5 | L68 L71 L122 A33 L121 | A29 L21 L22 | L22 L53 L116 A29 | A10 L89 A1 L58 L112 A27 L25 | L25 A27 L26 A10 | A29 L115 L26 L21 | L131 L76 L79 L130 A7 | L79 L76 L131 A39 L130 | A31 L118 L65 L50 | L50 L49 A31 | L49 A31 L119 L66 A3 L94 A14 | L82 L127 A36 L33 | L81 L128 A6 L127 L82 | A6 L83 L127 A37 L128 L80 | L46 A25 L109 L49 | L49 L109 A2 L110 L62 | A2 L63 L110 A24 L109 L60 | L73 L125 A35 L42 | L74 L124 A4 L125 L73 | A4 L72 L125 A34 L124 L75 | L26 L115 A0 L116 L53 | A0 L52 L116 A28 L115 L55 | A27 L112 L58 L25 | L25 L26 A27 | L26 A27 L113 L57 A1 L88 A10 | L86 A0 L26 | L66 L119 A31 L49 | L65 L118 A3 L119 L66 | A3 L67 L119 A30 L118 L64 | L92 A2 L49 | L81 A6 L128 | L127 A6 L82 | L80 L128 A6 | L49 A2 L109 | L110 A2 L62 | A2 L110 L63 | L125 A4 L73 | L74 A4 L124 | L75 L124 A4 | L26 A0 L115 | L116 A0 L53 | A0 L116 L52 | L57 L113 A27 L26 | L58 L112 A1 L113 L57 | A1 L56 L113 A26 L112 L59 | L55 L115 A0 | L65 A3 L118 | L119 A3 L66 | L64 L118 A3 | L60 L109 A2 | L128 L80 L83 L127 A6 | A6 L127 L83 | L128 A37 L127 L83 L80 | L109 L60 L63 L110 A2 | L63 L60 L109 A24 L110 | A4 L125 L72 | A4 L124 L75 L72 L125 | L124 A34 L125 L72 L75 | L115 L55 L52 L116 A0 | L52 L55 L115 A28 L116 | L113 A1 L57 | L58 A1 L112 | L59 L112 A1 | L118 L64 L67 L119 A3 | A3 L119 L67 | L118 A30 L119 L67 L64 | A1 L113 L56 | A1 L112 L59 L56 L113 | L112 A26 L113 L56 L59
extrude "Extrusion11" cut sketch "Sketch6" along normal blind 4 contours A32 L37 L38 | L38 L69 L121 A32 | A38 L30 L29 | L29 L78 L130 A38 | A38 L131 L33 L30 | L37 A32 L122 L42 | L42 L122 A5 L121 L69 | L33 L131 A7 L130 L78 | A36 L128 L81 L34 | L34 L33 A36 | A25 L46 L45 | L45 L62 L110 A25 | A35 L124 L74 L41 | L41 L42 A35 | L122 L71 L68 L121 A5 | L68 L71 L122 A33 L121 | A29 L21 L22 | L22 L53 L116 A29 | A29 L115 L26 L21 | L131 L76 L79 L130 A7 | L79 L76 L131 A39 L130 | A31 L118 L65 L50 | L50 L49 A31 | L82 L127 A36 L33 | L81 L128 A6 L127 L82 | L46 A25 L109 L49 | L49 L109 A2 L110 L62 | L73 L125 A35 L42 | L74 L124 A4 L125 L73 | L26 L115 A0 L116 L53 | A27 L112 L58 L25 | L25 L26 A27 | L66 L119 A31 L49 | L65 L118 A3 L119 L66 | L57 L113 A27 L26 | L58 L112 A1 L113 L57 | L128 L80 L83 L127 A6 | L128 A37 L127 L83 L80 | L109 L60 L63 L110 A2 | L63 L60 L109 A24 L110 | A4 L124 L75 L72 L125 | L124 A34 L125 L72 L75 | L115 L55 L52 L116 A0 | L52 L55 L115 A28 L116 | L118 L64 L67 L119 A3 | L118 A30 L119 L67 L64 | A1 L112 L59 L56 L113 | L112 A26 L113 L56 L59
move or copy body "Move Body1" bodies to move or copy 1 copy no rotation origin (0, 0, 0) rotation axis (0, 0, 1) rotation angle 180
properties part number "middle"
